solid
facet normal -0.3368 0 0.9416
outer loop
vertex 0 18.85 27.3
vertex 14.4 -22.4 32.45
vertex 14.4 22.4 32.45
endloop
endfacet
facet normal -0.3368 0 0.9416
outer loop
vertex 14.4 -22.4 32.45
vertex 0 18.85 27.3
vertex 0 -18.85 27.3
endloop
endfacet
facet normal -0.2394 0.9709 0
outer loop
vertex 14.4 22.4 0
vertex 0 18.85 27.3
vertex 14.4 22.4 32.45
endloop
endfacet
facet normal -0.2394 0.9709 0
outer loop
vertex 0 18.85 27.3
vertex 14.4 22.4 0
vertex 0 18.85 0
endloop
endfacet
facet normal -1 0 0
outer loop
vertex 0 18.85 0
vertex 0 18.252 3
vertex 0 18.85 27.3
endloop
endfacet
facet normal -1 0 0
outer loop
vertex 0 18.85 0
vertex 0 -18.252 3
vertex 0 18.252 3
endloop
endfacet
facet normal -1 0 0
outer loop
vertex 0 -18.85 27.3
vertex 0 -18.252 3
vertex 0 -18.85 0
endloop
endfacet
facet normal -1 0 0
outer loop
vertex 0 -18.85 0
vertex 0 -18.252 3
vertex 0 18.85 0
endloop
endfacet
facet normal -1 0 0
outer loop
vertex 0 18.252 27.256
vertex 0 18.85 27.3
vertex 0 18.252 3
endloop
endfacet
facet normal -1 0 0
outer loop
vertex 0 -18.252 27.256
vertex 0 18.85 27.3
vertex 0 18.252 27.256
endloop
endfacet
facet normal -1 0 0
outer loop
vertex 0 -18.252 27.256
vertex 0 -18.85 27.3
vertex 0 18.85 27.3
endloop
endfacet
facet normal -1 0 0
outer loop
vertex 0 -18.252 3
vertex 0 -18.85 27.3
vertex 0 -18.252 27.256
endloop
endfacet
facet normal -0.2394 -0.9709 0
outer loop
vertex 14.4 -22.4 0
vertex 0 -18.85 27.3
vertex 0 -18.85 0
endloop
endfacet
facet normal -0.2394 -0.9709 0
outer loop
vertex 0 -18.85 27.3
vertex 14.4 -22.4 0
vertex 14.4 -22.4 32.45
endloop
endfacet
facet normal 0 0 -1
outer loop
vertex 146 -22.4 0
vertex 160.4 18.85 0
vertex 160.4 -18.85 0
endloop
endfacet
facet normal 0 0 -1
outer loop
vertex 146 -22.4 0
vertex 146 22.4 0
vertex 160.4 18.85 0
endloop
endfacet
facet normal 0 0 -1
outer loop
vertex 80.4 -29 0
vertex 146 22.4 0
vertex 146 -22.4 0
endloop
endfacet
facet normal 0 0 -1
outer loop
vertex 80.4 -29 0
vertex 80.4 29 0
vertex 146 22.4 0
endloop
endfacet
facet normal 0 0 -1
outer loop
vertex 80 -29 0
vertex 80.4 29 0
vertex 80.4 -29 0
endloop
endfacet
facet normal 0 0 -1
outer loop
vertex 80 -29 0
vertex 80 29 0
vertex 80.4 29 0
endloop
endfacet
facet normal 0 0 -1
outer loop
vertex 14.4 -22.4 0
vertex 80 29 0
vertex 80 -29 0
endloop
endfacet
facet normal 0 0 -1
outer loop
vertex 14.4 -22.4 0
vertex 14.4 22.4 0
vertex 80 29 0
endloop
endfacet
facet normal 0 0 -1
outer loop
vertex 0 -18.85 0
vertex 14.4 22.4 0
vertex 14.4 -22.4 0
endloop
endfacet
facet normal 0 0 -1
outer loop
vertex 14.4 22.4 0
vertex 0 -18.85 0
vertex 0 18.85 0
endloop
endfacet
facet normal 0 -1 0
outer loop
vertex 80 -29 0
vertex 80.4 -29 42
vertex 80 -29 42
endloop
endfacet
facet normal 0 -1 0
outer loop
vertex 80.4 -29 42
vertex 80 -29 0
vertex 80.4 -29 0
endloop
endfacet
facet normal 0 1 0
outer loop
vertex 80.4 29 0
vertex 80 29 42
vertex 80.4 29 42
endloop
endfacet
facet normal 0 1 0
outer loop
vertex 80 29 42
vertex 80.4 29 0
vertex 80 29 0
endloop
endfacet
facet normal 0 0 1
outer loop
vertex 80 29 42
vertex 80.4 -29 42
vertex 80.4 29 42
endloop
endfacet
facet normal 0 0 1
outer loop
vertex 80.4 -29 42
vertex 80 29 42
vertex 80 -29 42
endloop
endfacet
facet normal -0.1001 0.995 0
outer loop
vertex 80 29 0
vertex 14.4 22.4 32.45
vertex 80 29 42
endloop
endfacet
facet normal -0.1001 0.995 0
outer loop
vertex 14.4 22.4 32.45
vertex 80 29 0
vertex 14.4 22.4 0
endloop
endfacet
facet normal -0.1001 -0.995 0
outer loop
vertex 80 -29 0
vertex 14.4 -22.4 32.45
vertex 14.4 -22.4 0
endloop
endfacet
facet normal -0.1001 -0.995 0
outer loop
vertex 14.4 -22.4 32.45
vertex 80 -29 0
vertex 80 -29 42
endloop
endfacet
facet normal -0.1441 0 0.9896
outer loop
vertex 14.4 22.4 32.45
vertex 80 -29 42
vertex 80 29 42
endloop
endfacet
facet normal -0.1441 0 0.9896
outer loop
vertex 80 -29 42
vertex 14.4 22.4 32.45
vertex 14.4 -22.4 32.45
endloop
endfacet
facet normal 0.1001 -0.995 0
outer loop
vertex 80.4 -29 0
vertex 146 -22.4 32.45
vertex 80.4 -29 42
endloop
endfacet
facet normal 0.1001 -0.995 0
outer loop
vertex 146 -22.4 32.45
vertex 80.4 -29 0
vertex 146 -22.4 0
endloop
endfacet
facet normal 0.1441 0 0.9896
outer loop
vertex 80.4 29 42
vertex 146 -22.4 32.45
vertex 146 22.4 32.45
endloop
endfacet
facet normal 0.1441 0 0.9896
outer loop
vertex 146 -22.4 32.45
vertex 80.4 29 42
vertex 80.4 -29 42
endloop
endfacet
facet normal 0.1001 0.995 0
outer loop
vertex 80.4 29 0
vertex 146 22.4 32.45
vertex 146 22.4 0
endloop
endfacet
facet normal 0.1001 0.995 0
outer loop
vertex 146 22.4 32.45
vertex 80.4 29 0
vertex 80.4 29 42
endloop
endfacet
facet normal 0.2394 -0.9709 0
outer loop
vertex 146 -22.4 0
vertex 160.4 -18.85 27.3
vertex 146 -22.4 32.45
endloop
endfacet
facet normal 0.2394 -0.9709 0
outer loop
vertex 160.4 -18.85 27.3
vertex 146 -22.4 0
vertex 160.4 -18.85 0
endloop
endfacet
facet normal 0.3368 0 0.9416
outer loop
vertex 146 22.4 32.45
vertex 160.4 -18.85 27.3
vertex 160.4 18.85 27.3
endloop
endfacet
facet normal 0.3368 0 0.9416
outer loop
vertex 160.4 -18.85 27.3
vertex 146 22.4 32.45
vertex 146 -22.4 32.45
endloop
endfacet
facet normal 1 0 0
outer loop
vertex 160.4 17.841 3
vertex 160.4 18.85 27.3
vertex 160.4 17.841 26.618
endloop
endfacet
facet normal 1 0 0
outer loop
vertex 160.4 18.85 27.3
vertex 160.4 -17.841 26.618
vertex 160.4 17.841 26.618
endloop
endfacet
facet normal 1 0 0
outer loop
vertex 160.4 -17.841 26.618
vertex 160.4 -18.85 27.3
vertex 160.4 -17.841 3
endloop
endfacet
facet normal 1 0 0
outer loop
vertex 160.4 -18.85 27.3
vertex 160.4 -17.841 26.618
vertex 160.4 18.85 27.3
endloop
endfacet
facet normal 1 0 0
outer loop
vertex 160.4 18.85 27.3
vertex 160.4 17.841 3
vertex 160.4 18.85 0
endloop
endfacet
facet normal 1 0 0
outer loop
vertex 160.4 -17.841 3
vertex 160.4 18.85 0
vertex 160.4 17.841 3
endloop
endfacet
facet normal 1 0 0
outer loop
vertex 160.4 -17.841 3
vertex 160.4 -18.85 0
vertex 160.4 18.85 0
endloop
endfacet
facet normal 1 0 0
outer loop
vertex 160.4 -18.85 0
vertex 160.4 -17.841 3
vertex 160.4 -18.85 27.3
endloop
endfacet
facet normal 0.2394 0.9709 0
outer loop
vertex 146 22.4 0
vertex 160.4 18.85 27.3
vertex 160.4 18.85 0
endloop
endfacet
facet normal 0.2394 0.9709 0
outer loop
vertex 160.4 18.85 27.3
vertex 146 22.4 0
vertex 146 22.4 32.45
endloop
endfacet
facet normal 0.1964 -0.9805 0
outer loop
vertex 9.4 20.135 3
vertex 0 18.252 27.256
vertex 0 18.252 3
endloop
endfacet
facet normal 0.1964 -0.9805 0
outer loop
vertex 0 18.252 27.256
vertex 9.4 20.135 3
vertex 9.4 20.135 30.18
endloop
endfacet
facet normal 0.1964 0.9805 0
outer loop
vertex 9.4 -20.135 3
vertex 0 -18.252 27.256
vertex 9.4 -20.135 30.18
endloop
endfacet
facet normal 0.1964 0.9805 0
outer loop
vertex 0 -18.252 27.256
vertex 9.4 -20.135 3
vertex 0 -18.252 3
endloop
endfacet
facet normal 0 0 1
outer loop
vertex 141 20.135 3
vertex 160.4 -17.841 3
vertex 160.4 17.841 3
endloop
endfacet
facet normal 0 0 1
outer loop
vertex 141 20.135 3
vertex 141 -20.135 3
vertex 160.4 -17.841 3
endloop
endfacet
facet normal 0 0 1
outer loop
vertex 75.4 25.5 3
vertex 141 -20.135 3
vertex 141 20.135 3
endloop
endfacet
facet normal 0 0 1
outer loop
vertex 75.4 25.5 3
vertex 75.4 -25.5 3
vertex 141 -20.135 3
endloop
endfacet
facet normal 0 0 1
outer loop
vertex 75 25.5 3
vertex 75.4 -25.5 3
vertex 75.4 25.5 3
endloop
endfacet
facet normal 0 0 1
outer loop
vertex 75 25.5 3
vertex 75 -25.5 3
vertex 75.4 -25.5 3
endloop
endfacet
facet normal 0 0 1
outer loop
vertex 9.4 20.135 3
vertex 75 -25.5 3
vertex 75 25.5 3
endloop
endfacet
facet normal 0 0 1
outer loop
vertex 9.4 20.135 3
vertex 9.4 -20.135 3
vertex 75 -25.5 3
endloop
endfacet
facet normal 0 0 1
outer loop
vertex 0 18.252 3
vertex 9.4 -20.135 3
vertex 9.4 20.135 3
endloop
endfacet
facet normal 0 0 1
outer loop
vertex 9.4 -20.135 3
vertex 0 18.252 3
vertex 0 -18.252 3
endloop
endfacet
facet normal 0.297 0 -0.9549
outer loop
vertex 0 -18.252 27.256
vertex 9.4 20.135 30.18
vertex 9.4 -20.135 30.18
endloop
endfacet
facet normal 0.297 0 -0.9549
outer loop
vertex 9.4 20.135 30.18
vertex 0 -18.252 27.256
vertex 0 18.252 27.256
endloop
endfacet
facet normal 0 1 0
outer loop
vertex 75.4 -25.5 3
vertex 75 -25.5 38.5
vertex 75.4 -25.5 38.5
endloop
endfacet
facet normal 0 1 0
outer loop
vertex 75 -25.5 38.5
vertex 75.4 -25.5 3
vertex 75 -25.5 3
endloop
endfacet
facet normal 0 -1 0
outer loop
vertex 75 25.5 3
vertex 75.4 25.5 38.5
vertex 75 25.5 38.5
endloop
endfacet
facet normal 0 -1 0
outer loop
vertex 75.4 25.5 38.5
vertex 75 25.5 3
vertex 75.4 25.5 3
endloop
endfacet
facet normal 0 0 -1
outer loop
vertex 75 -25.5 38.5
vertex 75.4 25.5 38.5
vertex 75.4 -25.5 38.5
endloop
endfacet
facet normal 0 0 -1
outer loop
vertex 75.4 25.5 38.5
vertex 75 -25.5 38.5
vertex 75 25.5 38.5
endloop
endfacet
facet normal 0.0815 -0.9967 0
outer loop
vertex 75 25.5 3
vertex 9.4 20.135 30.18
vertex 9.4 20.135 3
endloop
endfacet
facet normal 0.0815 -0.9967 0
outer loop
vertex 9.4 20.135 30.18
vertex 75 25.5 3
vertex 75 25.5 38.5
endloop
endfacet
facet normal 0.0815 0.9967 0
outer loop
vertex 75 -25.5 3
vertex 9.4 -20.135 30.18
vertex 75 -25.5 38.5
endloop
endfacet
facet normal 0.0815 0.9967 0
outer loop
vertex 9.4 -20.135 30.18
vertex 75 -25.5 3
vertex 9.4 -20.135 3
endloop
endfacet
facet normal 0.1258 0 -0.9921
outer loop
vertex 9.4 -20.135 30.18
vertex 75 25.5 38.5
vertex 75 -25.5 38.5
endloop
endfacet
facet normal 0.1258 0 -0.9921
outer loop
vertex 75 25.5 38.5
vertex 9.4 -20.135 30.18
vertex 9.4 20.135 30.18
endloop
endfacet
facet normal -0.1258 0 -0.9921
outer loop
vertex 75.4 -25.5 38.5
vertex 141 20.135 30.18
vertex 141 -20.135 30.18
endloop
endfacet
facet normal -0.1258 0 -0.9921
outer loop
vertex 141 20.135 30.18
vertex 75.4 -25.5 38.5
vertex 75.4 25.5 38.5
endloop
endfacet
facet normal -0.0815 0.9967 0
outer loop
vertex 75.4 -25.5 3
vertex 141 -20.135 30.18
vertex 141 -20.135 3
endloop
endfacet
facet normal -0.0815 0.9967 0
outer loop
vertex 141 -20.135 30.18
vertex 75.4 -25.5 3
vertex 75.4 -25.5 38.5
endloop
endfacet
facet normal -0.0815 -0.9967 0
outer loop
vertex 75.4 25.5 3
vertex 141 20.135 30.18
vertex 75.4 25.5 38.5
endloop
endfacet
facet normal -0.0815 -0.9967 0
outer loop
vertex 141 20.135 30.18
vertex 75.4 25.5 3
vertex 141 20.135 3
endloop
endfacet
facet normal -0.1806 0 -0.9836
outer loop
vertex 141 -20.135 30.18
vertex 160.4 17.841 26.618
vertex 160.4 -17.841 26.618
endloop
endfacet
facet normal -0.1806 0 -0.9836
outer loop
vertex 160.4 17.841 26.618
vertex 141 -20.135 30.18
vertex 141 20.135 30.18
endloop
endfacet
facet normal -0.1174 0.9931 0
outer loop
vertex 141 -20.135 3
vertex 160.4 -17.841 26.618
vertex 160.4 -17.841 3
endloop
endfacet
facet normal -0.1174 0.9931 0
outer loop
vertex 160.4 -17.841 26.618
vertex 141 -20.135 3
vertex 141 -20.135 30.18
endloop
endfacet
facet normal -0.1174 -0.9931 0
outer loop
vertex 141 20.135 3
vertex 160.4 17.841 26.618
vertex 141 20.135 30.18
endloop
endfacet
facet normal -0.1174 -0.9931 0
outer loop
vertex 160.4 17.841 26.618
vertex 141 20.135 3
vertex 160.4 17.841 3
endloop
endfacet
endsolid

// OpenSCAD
$fn = 32;

// ----------------------------------------------------------------------
// Faired channel: 160 x 58 x 42 mm, 3.5 mm walls, faired ends
// ----------------------------------------------------------------------

// --- parameters (mm) ---
length = 160;             // channel length
width = 58;               // channel width at mid length
height = 42;              // channel height at mid length
wall = 3.5;               // side wall thickness
floor_t = 3;              // floor thickness
end_w = 37.7;             // faired end width
end_h = 27.3;             // faired end height

difference() {
  union() {
    hull() {
      translate([0, -18.85, 0]) cube([0.4, 37.7, 27.3]);
      translate([14.4, -22.4, 0]) cube([0.4, 44.8, 32.45]);
    }
    hull() {
      translate([14.4, -22.4, 0]) cube([0.4, 44.8, 32.45]);
      translate([80, -29, 0]) cube([0.4, 58, 42]);
    }
    hull() {
      translate([80, -29, 0]) cube([0.4, 58, 42]);
      translate([145.6, -22.4, 0]) cube([0.4, 44.8, 32.45]);
    }
    hull() {
      translate([145.6, -22.4, 0]) cube([0.4, 44.8, 32.45]);
      translate([160, -18.85, 0]) cube([0.4, 37.7, 27.3]);
    }
  }
  /* cavity, 5 mm proud of both ends so the ports are cut clean */
  hull() {
    translate([-5, -17.25, 3]) cube([0.4, 34.5, 22.7]);
    translate([9.4, -20.135, 3]) cube([0.4, 40.27, 27.18]);
  }
  hull() {
    translate([9.4, -20.135, 3]) cube([0.4, 40.27, 27.18]);
    translate([75, -25.5, 3]) cube([0.4, 51, 35.5]);
  }
  hull() {
    translate([75, -25.5, 3]) cube([0.4, 51, 35.5]);
    translate([140.6, -20.135, 3]) cube([0.4, 40.27, 27.18]);
  }
  hull() {
    translate([140.6, -20.135, 3]) cube([0.4, 40.27, 27.18]);
    translate([165, -17.25, 3]) cube([0.4, 34.5, 22.7]);
  }
}
